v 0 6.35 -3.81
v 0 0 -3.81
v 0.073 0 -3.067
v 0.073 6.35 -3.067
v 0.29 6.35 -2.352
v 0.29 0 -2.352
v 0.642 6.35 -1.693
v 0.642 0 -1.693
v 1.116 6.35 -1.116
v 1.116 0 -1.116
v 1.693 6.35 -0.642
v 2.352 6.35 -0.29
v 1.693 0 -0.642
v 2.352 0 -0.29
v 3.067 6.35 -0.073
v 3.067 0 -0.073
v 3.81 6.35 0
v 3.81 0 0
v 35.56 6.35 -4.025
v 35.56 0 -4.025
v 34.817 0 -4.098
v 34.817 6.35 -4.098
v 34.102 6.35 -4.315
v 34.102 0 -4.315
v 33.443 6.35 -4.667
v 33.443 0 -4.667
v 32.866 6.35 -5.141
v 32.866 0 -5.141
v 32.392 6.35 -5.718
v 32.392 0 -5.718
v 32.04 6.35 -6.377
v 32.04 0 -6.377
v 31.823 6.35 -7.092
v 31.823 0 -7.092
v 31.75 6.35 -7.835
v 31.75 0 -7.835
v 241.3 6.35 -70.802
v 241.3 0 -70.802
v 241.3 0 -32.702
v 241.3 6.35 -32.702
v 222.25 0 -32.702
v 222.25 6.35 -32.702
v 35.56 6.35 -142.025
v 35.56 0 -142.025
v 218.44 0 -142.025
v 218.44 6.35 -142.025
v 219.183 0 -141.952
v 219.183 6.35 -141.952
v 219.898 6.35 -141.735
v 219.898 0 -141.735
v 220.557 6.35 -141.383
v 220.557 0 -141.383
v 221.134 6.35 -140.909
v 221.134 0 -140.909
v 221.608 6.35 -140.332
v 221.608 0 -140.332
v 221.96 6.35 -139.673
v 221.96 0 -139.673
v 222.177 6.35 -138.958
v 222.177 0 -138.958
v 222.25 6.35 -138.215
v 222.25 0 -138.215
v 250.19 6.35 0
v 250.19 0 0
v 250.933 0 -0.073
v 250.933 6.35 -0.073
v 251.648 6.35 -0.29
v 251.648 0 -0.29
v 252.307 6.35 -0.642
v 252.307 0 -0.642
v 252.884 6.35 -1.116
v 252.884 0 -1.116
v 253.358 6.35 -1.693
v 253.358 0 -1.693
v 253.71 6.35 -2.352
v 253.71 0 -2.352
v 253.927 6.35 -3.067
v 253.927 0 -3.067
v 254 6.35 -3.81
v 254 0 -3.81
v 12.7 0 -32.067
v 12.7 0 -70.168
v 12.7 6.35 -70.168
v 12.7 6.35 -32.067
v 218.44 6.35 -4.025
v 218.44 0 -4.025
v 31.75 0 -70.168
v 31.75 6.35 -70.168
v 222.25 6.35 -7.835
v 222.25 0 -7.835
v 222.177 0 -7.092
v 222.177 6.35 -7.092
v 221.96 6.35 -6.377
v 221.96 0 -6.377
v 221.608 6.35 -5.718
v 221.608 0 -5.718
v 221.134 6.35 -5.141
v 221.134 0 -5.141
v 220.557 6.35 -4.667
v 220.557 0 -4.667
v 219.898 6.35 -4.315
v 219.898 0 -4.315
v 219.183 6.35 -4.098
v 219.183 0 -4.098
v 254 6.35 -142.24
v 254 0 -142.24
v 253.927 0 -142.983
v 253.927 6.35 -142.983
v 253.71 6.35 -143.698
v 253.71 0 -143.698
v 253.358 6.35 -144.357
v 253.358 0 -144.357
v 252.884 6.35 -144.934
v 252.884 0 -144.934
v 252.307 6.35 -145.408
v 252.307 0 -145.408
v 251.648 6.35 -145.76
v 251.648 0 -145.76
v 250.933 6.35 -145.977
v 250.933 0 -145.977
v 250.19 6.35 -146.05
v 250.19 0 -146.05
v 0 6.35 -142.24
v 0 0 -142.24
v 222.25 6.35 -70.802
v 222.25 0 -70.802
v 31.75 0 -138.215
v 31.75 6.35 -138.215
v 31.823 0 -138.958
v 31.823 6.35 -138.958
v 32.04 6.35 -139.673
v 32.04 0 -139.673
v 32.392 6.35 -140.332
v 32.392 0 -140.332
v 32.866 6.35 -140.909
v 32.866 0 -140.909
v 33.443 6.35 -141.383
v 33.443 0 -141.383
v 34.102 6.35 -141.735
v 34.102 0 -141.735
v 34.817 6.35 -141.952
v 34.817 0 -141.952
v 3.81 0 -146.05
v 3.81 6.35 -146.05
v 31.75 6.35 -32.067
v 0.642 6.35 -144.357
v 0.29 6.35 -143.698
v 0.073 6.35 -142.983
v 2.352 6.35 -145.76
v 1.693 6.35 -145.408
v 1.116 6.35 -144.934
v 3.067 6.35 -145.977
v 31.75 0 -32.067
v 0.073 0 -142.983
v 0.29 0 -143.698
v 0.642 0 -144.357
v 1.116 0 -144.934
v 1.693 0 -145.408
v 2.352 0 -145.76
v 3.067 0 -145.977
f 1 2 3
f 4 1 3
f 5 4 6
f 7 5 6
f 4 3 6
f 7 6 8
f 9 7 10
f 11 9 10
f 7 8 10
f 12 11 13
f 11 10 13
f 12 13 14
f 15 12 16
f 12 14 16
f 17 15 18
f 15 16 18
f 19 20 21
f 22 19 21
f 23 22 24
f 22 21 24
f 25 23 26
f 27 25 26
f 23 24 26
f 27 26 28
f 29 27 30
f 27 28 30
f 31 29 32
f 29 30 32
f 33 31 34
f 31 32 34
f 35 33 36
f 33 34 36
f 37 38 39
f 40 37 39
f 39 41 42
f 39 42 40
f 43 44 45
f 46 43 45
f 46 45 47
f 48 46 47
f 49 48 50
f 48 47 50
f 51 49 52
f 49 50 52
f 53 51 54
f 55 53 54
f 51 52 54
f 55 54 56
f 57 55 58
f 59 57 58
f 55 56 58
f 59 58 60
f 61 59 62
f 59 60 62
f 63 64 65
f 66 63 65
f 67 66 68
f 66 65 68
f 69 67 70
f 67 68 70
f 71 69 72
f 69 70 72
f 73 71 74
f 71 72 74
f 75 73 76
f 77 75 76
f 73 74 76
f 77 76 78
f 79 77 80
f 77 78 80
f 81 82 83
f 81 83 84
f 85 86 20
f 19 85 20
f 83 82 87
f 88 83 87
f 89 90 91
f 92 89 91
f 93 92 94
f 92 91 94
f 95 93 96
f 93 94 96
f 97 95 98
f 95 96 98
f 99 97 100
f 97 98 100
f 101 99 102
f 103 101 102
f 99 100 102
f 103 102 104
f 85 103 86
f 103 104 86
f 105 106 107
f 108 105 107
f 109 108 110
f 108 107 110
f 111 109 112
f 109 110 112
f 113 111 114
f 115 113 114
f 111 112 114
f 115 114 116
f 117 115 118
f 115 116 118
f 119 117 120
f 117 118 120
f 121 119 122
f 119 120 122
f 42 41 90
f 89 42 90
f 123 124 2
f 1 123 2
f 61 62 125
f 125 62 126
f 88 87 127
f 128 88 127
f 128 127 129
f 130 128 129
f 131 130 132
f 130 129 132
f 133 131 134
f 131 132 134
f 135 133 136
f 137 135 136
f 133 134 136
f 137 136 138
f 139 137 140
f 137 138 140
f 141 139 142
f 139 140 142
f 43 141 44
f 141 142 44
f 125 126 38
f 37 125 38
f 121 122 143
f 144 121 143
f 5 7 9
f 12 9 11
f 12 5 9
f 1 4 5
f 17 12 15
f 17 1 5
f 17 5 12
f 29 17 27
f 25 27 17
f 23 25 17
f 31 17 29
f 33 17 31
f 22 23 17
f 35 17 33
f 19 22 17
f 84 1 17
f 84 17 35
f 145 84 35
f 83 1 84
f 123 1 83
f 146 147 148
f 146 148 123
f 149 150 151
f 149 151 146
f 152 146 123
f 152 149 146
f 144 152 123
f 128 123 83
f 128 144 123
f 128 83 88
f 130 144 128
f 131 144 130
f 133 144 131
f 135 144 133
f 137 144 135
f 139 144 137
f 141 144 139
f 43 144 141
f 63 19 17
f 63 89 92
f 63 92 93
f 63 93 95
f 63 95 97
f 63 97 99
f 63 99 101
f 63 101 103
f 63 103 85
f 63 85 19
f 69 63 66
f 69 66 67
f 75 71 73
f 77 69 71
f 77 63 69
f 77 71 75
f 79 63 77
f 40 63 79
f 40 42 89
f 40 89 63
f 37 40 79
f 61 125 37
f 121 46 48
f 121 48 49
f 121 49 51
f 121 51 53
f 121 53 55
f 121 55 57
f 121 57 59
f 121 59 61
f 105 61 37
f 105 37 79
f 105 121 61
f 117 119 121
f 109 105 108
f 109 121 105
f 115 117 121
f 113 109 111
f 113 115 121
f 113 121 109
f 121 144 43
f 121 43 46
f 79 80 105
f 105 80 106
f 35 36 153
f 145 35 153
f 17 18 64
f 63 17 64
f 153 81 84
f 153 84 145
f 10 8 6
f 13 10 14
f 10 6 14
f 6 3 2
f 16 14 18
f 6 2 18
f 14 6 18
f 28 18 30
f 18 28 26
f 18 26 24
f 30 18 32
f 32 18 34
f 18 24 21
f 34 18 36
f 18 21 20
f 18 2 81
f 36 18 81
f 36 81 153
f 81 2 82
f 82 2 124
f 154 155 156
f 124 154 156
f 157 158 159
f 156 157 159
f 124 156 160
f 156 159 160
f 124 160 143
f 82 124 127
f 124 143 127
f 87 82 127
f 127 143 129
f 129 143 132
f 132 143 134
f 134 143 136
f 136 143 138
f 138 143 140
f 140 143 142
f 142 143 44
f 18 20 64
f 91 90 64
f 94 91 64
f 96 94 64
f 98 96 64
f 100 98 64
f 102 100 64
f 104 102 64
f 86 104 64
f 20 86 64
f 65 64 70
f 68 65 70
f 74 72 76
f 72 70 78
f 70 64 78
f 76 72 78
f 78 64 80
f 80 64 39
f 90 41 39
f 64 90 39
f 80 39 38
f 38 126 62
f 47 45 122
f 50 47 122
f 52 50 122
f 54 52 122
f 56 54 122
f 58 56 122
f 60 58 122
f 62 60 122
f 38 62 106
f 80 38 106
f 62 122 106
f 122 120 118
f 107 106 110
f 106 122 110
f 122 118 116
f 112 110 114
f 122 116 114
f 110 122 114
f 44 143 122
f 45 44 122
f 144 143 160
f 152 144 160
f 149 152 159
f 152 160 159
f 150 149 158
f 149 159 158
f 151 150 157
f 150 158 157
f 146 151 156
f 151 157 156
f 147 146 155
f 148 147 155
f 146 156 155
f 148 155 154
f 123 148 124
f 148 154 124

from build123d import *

# Parameters (mm, degrees)
BOSS_EXTRUDE1_DEPTH = 6.35
SKETCH3_W           = 19.05
SKETCH3_H           = 38.1
CUT_EXTRUDE1_DEPTH  = 294.064711284


with BuildPart() as part:
    # Sketch1 → Boss-Extrude1 (new body)
    with BuildSketch(Plane(origin=(0, 0, 0), x_dir=(1, 0, 0), z_dir=(0, 1, 0))):
        with BuildLine():
            Line((3.81, 0), (250.19, 0))
            ThreePointArc((250.19, 0), (252.884076836, 1.115923164), (254, 3.81))
            Line((254, 3.81), (254, 142.24))
            ThreePointArc((254, 142.24), (252.884076836, 144.934076836), (250.19, 146.05))
            Line((250.19, 146.05), (3.81, 146.05))
            ThreePointArc((3.81, 146.05), (1.115923164, 144.934076836), (0, 142.24))
            Line((0, 142.24), (0, 3.81))
            ThreePointArc((0, 3.81), (1.115923164, 1.115923164), (3.81, 0))
        make_face()
        with BuildLine():
            Line((35.56, 142.025), (218.44, 142.025))
            ThreePointArc((218.44, 142.025), (221.134076836, 140.909076836), (222.25, 138.215))
            Line((222.25, 138.215), (222.25, 7.835))
            ThreePointArc((222.25, 7.835), (221.134076836, 5.140923164), (218.44, 4.025))
            Line((218.44, 4.025), (35.56, 4.025))
            ThreePointArc((35.56, 4.025), (32.865923164, 5.140923164), (31.75, 7.835))
            Line((31.75, 7.835), (31.75, 138.215))
            ThreePointArc((31.75, 138.215), (32.865923164, 140.909076836), (35.56, 142.025))
        make_face(mode=Mode.SUBTRACT)
    extrude(amount=BOSS_EXTRUDE1_DEPTH)

    # Sketch3 → Cut-Extrude1 (cut, through all)
    with BuildSketch(Plane.XZ):
        with Locations((231.775, -51.7525)):
            Rectangle(SKETCH3_W, SKETCH3_H)
        with Locations((22.225, -51.1175)):
            Rectangle(SKETCH3_W, SKETCH3_H)
    extrude(amount=-CUT_EXTRUDE1_DEPTH, mode=Mode.SUBTRACT)


solid = part.part
